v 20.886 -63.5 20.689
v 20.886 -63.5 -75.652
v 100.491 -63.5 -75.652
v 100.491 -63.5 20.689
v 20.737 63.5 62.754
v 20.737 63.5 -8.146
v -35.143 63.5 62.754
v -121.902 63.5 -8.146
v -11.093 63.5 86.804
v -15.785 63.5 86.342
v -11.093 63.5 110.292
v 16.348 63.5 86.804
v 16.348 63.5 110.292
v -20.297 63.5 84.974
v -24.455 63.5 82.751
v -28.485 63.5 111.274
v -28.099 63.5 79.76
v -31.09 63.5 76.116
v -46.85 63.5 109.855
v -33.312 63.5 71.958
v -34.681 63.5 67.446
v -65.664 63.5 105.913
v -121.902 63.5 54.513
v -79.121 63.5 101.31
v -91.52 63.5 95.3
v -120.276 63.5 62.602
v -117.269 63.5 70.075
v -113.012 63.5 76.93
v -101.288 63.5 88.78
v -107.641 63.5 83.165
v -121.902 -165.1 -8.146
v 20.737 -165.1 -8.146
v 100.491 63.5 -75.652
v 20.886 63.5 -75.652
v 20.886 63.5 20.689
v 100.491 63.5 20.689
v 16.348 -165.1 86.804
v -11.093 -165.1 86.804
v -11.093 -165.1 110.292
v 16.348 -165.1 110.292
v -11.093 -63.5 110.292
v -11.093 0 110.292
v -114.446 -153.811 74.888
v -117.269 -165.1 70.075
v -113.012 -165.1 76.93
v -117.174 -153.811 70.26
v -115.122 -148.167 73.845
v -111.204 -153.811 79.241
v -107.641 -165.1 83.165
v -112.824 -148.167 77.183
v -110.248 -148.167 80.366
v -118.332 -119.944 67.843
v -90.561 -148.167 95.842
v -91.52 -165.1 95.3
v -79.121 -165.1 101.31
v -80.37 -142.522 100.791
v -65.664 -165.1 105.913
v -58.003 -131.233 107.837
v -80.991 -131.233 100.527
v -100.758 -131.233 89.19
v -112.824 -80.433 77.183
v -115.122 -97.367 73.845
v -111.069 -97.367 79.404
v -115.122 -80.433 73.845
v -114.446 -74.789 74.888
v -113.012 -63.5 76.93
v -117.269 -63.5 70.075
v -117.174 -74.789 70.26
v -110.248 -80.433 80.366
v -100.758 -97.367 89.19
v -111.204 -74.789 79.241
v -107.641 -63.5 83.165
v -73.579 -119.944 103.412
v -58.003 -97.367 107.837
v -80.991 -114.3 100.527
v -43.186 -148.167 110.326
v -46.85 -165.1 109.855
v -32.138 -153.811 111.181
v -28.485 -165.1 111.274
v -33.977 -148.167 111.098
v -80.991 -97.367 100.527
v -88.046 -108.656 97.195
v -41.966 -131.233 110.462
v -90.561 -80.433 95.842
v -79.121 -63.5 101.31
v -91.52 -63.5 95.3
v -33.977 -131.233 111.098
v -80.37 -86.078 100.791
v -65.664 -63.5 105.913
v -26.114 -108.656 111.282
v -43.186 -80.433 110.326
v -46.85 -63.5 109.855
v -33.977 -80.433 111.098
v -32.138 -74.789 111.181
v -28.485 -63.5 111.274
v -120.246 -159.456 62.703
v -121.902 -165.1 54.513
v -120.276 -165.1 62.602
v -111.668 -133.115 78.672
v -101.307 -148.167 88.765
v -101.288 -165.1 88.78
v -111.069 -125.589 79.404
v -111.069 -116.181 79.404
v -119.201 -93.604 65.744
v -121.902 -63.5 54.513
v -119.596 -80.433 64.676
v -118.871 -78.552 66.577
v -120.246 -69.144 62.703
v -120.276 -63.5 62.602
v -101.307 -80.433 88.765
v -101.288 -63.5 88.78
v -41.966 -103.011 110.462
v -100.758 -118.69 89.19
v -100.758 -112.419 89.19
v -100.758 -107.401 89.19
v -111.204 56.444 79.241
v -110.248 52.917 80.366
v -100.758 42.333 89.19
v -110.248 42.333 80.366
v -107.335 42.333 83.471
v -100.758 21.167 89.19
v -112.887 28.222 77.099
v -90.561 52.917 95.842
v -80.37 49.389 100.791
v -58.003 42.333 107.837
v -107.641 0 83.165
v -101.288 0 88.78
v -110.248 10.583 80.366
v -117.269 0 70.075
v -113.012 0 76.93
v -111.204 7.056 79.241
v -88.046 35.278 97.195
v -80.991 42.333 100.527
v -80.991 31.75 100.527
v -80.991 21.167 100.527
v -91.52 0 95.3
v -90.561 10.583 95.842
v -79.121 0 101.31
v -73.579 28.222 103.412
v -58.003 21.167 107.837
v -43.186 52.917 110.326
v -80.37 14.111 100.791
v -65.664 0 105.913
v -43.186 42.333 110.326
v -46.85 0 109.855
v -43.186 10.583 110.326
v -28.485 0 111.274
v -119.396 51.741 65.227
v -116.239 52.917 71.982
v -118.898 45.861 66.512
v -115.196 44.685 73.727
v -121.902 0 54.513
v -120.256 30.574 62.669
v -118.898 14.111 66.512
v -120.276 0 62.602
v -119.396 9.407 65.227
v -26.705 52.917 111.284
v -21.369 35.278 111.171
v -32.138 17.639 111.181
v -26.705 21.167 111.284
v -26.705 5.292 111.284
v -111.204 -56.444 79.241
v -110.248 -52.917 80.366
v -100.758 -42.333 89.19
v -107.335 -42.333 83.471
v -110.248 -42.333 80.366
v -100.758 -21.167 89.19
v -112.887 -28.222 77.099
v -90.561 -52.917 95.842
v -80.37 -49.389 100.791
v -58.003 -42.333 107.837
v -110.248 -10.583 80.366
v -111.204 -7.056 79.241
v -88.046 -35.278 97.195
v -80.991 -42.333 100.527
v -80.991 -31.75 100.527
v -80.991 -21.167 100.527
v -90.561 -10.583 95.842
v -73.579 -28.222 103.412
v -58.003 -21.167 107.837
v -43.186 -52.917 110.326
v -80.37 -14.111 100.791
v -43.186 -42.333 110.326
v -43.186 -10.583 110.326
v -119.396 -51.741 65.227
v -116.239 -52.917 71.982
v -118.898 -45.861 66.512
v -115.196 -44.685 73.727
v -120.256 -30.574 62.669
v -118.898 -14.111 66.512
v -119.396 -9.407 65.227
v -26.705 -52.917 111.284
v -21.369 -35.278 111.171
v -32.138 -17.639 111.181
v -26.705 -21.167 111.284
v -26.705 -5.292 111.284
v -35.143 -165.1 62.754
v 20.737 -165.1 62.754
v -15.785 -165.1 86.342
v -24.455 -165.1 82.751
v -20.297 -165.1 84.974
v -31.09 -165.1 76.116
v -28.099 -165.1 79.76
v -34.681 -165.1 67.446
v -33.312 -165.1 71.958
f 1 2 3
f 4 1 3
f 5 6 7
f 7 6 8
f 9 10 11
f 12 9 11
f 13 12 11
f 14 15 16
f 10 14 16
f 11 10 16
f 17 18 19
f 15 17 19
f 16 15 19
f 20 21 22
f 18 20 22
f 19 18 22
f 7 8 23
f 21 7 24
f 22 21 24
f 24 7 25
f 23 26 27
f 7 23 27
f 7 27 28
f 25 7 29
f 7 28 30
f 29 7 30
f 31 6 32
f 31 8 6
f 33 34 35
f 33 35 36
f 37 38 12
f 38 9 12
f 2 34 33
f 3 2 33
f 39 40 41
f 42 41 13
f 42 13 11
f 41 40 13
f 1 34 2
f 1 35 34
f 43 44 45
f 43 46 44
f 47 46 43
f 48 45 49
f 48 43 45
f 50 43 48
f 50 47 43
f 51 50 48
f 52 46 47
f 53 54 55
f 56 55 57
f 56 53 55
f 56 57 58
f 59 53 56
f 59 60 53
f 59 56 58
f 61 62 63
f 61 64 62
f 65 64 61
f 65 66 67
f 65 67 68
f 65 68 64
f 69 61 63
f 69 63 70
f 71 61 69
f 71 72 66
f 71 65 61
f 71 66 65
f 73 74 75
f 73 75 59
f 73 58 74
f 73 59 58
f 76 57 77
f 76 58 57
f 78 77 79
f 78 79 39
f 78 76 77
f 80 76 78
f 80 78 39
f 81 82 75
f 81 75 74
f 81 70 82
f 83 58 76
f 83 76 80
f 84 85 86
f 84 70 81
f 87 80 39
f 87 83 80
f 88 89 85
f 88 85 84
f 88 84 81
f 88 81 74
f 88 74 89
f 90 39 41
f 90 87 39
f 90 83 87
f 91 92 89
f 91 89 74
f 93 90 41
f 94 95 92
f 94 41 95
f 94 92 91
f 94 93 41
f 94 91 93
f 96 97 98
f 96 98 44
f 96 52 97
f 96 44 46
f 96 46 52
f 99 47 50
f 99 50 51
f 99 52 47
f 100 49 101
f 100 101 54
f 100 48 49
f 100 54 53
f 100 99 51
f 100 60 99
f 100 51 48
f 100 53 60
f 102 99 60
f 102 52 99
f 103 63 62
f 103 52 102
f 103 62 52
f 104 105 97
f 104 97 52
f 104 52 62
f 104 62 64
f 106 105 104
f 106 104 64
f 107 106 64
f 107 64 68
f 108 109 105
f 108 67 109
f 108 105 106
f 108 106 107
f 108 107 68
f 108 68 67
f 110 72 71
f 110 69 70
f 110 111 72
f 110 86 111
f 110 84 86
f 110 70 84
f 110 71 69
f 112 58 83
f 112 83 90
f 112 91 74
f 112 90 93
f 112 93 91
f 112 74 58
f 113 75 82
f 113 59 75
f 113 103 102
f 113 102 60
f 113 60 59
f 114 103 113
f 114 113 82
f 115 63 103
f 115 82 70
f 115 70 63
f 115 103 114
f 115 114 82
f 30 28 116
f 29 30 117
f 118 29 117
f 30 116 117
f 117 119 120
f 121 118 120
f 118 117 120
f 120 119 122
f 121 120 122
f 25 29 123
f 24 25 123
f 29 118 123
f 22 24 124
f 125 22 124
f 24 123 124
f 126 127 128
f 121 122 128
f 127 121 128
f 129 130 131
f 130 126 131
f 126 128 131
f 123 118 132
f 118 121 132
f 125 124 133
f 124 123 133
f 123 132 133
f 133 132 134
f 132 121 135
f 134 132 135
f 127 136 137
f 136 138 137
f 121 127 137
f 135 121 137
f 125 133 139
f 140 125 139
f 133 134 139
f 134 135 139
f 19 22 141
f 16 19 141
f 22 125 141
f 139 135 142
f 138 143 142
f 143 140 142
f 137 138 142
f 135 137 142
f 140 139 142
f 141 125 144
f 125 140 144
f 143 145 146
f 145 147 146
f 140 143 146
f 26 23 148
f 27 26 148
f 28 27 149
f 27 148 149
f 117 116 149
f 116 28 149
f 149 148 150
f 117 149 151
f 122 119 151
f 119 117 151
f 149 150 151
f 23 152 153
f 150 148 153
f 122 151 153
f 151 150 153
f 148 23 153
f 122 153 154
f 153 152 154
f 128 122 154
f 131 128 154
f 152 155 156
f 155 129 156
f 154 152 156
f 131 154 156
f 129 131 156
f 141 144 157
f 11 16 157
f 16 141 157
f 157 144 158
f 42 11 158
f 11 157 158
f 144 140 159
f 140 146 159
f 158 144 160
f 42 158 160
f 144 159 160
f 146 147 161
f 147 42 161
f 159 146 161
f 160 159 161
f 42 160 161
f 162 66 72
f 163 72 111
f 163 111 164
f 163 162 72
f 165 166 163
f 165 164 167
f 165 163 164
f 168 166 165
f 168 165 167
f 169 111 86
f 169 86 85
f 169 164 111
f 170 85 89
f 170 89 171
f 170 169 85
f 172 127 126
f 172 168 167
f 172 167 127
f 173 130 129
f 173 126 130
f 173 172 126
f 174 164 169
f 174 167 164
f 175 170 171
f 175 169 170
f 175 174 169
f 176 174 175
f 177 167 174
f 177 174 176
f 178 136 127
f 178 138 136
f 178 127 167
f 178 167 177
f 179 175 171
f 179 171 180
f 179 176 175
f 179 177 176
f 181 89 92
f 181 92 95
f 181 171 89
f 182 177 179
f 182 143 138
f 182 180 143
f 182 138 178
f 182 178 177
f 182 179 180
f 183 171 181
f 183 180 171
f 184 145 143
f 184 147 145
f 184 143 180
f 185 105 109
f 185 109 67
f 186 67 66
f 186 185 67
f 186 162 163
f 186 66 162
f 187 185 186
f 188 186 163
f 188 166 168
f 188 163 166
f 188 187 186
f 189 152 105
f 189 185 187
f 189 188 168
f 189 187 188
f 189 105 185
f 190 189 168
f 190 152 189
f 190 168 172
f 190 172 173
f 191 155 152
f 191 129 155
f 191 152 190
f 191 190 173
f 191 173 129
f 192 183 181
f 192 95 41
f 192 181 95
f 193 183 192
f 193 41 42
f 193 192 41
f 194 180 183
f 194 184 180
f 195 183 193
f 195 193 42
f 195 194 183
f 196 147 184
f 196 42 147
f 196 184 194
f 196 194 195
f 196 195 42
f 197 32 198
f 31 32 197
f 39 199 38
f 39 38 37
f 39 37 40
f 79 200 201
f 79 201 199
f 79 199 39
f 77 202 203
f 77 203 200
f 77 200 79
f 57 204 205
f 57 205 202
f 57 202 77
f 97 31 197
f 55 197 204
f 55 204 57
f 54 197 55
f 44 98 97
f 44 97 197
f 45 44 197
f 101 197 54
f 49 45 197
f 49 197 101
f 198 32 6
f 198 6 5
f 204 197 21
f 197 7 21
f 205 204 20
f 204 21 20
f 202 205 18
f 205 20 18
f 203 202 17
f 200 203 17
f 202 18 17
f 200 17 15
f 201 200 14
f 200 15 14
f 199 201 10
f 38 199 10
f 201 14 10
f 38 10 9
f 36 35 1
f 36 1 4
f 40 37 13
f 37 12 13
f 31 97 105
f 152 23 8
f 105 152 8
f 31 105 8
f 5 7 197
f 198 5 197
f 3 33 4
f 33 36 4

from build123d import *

# Parameters (mm, degrees)
F1_DEPTH = 63.5
F0_W     = 79.6044021845
F0_H     = 25.2211969346
F2_DEPTH = 101.6
F3_DEPTH = 55.88
F4_W     = 79.6044021845
F4_H     = 127
F5_DEPTH = 71.12


with BuildPart() as f1:
    # F0 (on Front) → F1 (new body, symmetric)
    with BuildSketch(Plane.XZ):
        Polygon((-121.9016323911, -8.1461117186), (-35.1431321867, -8.1461117186), (-35.1431321867, 54.5127998523), (-58.6304253743, 54.5127998523), (-121.9016323911, 54.5127998523), align=None)
        with BuildLine():
            Line((-58.6304253743, 54.5127998523), (-35.1431321867, 54.5127998523))
            Line((-35.1431321867, 54.5127998523), (-35.1431321867, 62.754141607))
            ThreePointArc((-35.1431321867, 62.754141607), (-28.0990201588, 79.7601323996), (-11.0930293662, 86.8042444275))
            Line((-11.0930293662, 86.8042444275), (16.3480704476, 86.8042444275))
            Line((16.3480704476, 86.8042444275), (16.3480704476, 110.2915376151))
            Line((16.3480704476, 110.2915376151), (-11.0930293662, 110.2915376151))
            ThreePointArc((-11.0930293662, 110.2915376151), (-44.7070444435, 96.3681566843), (-58.6304253743, 62.754141607))
            Line((-58.6304253743, 62.754141607), (-58.6304253743, 54.5127998523))
        make_face()
        with BuildLine():
            add(Edge.make_bspline(
                [(-121.9016323911, 54.5127998523), (-117.3815886684, 97.1511993913), (-54.2627216707, 115.9869502764), (-11.0930293662, 110.2915376151)],
                knots=[0, 0, 0, 0, 124.0556894734, 124.0556894734, 124.0556894734, 124.0556894734], degree=3))
            Line((-121.9016323911, 54.5127998523), (-58.6304253743, 54.5127998523))
            Line((-58.6304253743, 54.5127998523), (-58.6304253743, 62.754141607))
            ThreePointArc((-58.6304253743, 62.754141607), (-44.7070444435, 96.3681566843), (-11.0930293662, 110.2915376151))
        make_face()
    extrude(amount=F1_DEPTH, both=True)

    # F2 (add): a face of the model
    f2_faces = [f1.faces().sort_by_distance(p)[0] for p in [
        (-67.329024411, -63.5, 52.0323549127),
    ]]
    extrude(f2_faces, amount=F2_DEPTH)

    # F3 (add): a face of the model
    f3_faces = [f1.faces().sort_by_distance(p)[0] for p in [
        (-35.1431321867, -50.8, 27.3040149442),
    ]]
    extrude(f3_faces, amount=F3_DEPTH)


with BuildPart() as f1b:
    # F0 (on Front) → F1, piece 2 (new body, symmetric)
    with BuildSketch(Plane.XZ):
        with Locations((60.6885105371, 8.0786645412)):
            Rectangle(F0_W, F0_H)
    extrude(amount=F1_DEPTH, both=True)

    # F4 (on face) → F5 (join)
    with BuildSketch(Plane(origin=(0, 0, -4.531933926), x_dir=(1, 0, 0), z_dir=(0, 0, -1))):
        with Locations((60.6885105371, 0)):
            Rectangle(F4_W, F4_H)
    extrude(amount=F5_DEPTH)


solid = Compound([f1.part, f1b.part])
